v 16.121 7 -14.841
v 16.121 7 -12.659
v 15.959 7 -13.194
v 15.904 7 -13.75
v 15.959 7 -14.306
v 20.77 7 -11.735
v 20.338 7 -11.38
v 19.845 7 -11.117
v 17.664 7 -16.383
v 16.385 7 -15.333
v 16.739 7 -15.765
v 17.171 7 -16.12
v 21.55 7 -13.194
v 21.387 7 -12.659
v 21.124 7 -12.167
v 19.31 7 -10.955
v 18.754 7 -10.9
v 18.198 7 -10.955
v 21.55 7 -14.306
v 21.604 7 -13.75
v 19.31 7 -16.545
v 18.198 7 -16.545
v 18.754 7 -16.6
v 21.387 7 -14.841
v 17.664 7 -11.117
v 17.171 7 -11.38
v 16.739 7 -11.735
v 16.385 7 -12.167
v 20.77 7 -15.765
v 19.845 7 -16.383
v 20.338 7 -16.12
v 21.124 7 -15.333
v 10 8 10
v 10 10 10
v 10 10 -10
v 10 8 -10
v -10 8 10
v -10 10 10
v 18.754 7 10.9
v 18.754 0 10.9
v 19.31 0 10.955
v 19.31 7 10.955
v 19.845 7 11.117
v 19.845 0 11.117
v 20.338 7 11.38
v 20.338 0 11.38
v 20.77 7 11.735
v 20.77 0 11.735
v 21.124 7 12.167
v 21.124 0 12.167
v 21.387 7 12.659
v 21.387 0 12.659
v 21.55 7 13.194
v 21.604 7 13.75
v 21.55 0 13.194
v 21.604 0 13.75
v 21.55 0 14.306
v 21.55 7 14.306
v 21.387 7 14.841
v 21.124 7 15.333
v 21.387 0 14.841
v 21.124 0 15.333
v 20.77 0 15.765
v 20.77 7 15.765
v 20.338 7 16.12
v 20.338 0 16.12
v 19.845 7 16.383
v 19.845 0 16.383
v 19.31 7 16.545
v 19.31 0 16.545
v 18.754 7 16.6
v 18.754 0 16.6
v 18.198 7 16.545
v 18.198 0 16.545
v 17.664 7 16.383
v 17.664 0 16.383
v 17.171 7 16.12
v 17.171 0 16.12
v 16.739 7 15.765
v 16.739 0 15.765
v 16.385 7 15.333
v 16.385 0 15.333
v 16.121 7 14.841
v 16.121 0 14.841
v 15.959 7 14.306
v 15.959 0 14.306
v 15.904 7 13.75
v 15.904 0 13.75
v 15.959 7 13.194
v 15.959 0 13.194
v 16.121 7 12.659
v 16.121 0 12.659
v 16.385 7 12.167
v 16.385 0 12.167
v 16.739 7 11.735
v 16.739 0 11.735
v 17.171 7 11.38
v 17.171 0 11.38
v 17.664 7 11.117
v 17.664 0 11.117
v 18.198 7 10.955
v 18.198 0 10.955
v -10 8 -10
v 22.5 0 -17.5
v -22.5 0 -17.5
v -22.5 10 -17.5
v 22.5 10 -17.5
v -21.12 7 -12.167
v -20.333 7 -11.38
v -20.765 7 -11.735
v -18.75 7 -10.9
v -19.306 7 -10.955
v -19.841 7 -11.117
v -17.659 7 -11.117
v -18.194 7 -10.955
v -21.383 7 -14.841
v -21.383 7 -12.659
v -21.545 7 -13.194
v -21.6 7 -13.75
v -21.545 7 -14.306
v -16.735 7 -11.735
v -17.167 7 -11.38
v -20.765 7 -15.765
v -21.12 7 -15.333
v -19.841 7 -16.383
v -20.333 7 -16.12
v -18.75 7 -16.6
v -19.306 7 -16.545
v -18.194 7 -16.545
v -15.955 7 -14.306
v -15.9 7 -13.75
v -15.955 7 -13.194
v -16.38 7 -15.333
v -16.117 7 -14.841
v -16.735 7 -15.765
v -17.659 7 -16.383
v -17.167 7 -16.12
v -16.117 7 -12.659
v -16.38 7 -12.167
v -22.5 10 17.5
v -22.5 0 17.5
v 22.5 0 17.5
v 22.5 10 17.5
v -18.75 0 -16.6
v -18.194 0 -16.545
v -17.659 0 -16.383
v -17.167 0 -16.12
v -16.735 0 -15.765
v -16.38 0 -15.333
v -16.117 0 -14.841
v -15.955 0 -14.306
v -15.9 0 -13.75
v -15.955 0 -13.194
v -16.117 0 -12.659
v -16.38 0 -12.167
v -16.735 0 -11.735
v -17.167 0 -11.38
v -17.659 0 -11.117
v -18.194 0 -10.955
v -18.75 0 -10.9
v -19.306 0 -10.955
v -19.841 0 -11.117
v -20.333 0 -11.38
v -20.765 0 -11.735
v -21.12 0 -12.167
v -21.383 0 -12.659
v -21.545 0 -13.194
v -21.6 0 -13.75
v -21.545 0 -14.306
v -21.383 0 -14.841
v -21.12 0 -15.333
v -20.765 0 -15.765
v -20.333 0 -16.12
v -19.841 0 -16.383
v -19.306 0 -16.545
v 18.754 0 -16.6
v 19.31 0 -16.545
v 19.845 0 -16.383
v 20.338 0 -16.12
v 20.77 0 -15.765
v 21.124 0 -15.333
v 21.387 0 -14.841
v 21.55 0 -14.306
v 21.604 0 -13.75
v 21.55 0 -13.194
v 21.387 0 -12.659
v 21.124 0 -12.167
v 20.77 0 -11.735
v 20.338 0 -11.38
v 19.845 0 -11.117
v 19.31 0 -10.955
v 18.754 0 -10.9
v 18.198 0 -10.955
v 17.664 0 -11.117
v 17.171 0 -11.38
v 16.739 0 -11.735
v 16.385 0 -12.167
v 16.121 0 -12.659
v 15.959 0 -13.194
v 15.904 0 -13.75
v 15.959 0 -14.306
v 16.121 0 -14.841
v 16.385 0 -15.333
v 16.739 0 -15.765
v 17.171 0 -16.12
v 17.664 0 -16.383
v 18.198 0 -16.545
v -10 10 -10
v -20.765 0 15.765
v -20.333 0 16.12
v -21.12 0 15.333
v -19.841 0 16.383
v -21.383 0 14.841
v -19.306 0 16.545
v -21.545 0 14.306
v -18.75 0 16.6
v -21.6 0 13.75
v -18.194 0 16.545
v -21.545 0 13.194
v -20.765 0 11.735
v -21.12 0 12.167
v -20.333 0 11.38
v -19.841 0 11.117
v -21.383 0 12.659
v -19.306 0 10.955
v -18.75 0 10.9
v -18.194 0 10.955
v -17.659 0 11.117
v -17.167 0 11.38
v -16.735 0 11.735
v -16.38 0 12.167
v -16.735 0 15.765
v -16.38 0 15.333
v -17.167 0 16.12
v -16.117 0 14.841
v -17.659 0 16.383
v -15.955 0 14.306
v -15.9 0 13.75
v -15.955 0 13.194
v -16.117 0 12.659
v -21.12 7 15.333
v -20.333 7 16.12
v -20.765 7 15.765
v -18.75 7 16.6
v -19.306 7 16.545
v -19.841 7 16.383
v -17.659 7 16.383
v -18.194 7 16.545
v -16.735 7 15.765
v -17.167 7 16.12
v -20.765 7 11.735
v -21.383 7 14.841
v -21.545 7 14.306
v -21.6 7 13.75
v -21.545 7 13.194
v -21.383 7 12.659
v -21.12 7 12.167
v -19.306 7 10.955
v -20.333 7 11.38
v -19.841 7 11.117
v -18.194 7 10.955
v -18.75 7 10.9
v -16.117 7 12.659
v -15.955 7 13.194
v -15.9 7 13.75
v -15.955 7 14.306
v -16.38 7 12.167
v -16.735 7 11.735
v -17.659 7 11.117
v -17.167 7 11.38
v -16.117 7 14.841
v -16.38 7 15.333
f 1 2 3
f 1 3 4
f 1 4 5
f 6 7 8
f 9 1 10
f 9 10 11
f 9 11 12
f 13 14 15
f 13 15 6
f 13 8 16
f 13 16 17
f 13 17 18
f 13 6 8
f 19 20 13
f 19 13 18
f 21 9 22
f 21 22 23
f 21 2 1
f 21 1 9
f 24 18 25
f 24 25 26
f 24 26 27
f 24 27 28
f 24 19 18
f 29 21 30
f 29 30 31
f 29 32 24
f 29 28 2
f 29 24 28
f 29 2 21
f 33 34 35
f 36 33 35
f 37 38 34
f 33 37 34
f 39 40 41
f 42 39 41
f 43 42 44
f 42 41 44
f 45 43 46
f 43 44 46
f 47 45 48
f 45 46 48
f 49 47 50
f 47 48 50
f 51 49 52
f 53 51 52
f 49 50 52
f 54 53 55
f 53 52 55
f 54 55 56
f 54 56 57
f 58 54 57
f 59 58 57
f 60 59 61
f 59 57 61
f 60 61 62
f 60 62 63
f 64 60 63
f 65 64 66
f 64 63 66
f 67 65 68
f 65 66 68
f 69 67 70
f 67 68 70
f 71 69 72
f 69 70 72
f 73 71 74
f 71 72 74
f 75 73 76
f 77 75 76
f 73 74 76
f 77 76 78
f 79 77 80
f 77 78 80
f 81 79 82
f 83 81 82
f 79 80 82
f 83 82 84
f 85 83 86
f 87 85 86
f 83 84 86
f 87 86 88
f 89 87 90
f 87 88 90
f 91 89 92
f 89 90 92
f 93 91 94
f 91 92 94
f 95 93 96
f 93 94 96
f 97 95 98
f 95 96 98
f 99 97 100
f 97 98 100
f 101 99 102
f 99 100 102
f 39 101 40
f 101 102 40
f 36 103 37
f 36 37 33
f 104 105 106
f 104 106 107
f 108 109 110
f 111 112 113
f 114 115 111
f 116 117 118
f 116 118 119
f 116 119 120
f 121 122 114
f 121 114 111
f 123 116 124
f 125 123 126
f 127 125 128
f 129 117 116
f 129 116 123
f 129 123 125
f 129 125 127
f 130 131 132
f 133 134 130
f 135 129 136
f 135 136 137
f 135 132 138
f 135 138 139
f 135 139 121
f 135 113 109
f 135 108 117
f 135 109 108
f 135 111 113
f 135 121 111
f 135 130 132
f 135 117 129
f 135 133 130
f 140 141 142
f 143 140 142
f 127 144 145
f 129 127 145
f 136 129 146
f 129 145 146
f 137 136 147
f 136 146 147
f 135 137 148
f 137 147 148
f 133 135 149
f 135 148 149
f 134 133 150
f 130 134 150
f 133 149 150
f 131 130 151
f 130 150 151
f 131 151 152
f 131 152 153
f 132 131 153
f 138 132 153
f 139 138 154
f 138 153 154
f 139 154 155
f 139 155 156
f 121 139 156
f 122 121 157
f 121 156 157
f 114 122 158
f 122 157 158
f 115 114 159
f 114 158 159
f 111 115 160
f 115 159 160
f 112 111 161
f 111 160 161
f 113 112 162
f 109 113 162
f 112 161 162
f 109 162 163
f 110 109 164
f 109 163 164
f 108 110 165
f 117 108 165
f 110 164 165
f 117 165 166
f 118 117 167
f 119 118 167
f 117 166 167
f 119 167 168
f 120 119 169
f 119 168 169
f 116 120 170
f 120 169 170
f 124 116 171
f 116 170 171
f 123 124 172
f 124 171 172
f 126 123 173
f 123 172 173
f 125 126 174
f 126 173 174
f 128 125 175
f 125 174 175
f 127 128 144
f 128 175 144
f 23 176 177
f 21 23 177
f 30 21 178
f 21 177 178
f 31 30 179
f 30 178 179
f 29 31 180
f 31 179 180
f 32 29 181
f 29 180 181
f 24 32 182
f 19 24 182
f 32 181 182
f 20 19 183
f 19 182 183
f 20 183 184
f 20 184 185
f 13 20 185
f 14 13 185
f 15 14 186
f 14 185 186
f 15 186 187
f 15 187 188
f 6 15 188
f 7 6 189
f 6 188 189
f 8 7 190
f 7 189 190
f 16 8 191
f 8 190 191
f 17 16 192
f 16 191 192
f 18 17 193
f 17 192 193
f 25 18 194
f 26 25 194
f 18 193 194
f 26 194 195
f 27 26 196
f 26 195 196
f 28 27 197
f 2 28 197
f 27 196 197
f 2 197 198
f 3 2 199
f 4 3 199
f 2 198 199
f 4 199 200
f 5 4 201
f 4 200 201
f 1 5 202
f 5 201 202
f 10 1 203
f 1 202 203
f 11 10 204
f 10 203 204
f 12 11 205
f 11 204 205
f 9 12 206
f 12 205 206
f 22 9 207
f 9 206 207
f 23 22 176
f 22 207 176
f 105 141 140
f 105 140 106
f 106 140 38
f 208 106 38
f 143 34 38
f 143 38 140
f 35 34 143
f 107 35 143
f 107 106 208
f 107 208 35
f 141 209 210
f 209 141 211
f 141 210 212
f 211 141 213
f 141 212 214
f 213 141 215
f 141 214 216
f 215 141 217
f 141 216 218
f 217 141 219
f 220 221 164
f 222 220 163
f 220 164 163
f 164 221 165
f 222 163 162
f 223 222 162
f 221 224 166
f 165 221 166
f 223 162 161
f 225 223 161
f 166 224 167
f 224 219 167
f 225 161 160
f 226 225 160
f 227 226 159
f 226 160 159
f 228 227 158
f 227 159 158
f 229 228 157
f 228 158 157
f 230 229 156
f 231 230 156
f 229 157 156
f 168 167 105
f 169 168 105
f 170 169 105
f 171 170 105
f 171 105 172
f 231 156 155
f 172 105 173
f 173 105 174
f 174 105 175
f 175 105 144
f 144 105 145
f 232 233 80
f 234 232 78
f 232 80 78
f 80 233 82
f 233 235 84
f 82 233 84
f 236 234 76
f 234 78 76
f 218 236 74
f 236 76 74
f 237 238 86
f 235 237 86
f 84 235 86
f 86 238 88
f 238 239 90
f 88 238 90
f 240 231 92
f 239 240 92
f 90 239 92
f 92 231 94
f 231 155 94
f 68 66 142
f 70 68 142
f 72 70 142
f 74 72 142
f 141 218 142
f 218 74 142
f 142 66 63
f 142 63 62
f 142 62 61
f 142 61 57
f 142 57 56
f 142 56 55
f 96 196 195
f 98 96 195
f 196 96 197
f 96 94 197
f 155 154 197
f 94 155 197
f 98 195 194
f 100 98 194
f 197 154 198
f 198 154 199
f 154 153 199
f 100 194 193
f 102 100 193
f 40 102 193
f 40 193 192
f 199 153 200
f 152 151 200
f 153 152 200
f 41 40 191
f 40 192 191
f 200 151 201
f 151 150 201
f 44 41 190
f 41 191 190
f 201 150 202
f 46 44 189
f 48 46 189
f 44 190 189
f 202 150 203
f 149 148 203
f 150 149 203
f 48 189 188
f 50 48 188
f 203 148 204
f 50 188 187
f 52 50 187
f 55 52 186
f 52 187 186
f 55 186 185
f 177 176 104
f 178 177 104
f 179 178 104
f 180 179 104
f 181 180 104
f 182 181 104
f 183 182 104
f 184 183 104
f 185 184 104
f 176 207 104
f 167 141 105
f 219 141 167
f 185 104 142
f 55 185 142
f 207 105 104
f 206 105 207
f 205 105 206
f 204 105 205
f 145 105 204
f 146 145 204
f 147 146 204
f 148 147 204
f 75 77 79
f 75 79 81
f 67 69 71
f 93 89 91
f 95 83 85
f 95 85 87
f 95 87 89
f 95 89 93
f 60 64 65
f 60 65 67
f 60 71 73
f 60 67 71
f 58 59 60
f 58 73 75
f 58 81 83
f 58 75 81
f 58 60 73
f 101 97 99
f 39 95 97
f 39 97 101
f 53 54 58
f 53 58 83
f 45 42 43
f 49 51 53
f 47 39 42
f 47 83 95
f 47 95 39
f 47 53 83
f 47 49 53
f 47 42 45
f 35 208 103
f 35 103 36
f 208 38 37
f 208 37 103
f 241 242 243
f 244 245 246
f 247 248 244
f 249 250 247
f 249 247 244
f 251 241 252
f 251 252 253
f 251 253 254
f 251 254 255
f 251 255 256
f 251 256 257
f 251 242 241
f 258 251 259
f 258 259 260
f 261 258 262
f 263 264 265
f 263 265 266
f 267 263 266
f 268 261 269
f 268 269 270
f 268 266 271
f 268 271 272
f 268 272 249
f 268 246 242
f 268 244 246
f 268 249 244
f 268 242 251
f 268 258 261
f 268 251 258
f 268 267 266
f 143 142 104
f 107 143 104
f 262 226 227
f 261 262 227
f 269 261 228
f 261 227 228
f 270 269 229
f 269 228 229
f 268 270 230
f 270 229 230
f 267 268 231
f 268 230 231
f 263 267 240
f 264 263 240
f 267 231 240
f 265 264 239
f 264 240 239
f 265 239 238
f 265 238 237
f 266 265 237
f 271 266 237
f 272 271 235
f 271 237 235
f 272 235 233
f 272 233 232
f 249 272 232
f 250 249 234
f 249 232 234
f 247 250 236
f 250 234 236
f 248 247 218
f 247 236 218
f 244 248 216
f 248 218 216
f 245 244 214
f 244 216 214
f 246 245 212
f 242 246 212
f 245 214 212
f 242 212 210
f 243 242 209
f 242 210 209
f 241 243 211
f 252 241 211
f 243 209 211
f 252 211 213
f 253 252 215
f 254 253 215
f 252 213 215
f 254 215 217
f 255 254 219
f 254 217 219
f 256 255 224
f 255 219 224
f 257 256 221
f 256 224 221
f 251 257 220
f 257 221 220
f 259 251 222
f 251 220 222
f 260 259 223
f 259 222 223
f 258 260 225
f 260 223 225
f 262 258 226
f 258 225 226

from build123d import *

# Parameters (mm, degrees)
SKETCH2_W           = 45
SKETCH2_H           = 35
BOSS_EXTRUDE1_DEPTH = 10
SKETCH3_W           = 20
SKETCH3_H           = 20
CUT_EXTRUDE1_DEPTH  = 2
SKETCH10_R          = 2.85
CUT_EXTRUDE2_DEPTH  = 7


with BuildPart() as part:
    # Sketch2 → Boss-Extrude1 (new body)
    with BuildSketch(Plane(origin=(0, 0, 0), x_dir=(1, 0, 0), z_dir=(0, 1, 0))):
        Rectangle(SKETCH2_W, SKETCH2_H)
    extrude(amount=BOSS_EXTRUDE1_DEPTH)

    # Sketch3 → Cut-Extrude1 (cut)
    with BuildSketch(Plane(origin=(0, 10, 0), x_dir=(1, 0, 0), z_dir=(0, 1, 0))):
        Rectangle(SKETCH3_W, SKETCH3_H)
    extrude(amount=-CUT_EXTRUDE1_DEPTH, mode=Mode.SUBTRACT)

    # Sketch10 → Cut-Extrude2 (cut)
    with BuildSketch(Plane.XZ):
        with Locations(Location((-18.75, 13.75, 0), (0, 0, 270))):
            Circle(SKETCH10_R)
        with Locations(Location((18.754391979, 13.75, 0), (0, 0, 270))):
            Circle(SKETCH10_R)
        with Locations(Location((18.754391979, -13.75, 0), (0, 0, 270))):
            Circle(SKETCH10_R)
        with Locations(Location((-18.75, -13.75, 0), (0, 0, 270))):
            Circle(SKETCH10_R)
    extrude(amount=-CUT_EXTRUDE2_DEPTH, mode=Mode.SUBTRACT)


solid = part.part
